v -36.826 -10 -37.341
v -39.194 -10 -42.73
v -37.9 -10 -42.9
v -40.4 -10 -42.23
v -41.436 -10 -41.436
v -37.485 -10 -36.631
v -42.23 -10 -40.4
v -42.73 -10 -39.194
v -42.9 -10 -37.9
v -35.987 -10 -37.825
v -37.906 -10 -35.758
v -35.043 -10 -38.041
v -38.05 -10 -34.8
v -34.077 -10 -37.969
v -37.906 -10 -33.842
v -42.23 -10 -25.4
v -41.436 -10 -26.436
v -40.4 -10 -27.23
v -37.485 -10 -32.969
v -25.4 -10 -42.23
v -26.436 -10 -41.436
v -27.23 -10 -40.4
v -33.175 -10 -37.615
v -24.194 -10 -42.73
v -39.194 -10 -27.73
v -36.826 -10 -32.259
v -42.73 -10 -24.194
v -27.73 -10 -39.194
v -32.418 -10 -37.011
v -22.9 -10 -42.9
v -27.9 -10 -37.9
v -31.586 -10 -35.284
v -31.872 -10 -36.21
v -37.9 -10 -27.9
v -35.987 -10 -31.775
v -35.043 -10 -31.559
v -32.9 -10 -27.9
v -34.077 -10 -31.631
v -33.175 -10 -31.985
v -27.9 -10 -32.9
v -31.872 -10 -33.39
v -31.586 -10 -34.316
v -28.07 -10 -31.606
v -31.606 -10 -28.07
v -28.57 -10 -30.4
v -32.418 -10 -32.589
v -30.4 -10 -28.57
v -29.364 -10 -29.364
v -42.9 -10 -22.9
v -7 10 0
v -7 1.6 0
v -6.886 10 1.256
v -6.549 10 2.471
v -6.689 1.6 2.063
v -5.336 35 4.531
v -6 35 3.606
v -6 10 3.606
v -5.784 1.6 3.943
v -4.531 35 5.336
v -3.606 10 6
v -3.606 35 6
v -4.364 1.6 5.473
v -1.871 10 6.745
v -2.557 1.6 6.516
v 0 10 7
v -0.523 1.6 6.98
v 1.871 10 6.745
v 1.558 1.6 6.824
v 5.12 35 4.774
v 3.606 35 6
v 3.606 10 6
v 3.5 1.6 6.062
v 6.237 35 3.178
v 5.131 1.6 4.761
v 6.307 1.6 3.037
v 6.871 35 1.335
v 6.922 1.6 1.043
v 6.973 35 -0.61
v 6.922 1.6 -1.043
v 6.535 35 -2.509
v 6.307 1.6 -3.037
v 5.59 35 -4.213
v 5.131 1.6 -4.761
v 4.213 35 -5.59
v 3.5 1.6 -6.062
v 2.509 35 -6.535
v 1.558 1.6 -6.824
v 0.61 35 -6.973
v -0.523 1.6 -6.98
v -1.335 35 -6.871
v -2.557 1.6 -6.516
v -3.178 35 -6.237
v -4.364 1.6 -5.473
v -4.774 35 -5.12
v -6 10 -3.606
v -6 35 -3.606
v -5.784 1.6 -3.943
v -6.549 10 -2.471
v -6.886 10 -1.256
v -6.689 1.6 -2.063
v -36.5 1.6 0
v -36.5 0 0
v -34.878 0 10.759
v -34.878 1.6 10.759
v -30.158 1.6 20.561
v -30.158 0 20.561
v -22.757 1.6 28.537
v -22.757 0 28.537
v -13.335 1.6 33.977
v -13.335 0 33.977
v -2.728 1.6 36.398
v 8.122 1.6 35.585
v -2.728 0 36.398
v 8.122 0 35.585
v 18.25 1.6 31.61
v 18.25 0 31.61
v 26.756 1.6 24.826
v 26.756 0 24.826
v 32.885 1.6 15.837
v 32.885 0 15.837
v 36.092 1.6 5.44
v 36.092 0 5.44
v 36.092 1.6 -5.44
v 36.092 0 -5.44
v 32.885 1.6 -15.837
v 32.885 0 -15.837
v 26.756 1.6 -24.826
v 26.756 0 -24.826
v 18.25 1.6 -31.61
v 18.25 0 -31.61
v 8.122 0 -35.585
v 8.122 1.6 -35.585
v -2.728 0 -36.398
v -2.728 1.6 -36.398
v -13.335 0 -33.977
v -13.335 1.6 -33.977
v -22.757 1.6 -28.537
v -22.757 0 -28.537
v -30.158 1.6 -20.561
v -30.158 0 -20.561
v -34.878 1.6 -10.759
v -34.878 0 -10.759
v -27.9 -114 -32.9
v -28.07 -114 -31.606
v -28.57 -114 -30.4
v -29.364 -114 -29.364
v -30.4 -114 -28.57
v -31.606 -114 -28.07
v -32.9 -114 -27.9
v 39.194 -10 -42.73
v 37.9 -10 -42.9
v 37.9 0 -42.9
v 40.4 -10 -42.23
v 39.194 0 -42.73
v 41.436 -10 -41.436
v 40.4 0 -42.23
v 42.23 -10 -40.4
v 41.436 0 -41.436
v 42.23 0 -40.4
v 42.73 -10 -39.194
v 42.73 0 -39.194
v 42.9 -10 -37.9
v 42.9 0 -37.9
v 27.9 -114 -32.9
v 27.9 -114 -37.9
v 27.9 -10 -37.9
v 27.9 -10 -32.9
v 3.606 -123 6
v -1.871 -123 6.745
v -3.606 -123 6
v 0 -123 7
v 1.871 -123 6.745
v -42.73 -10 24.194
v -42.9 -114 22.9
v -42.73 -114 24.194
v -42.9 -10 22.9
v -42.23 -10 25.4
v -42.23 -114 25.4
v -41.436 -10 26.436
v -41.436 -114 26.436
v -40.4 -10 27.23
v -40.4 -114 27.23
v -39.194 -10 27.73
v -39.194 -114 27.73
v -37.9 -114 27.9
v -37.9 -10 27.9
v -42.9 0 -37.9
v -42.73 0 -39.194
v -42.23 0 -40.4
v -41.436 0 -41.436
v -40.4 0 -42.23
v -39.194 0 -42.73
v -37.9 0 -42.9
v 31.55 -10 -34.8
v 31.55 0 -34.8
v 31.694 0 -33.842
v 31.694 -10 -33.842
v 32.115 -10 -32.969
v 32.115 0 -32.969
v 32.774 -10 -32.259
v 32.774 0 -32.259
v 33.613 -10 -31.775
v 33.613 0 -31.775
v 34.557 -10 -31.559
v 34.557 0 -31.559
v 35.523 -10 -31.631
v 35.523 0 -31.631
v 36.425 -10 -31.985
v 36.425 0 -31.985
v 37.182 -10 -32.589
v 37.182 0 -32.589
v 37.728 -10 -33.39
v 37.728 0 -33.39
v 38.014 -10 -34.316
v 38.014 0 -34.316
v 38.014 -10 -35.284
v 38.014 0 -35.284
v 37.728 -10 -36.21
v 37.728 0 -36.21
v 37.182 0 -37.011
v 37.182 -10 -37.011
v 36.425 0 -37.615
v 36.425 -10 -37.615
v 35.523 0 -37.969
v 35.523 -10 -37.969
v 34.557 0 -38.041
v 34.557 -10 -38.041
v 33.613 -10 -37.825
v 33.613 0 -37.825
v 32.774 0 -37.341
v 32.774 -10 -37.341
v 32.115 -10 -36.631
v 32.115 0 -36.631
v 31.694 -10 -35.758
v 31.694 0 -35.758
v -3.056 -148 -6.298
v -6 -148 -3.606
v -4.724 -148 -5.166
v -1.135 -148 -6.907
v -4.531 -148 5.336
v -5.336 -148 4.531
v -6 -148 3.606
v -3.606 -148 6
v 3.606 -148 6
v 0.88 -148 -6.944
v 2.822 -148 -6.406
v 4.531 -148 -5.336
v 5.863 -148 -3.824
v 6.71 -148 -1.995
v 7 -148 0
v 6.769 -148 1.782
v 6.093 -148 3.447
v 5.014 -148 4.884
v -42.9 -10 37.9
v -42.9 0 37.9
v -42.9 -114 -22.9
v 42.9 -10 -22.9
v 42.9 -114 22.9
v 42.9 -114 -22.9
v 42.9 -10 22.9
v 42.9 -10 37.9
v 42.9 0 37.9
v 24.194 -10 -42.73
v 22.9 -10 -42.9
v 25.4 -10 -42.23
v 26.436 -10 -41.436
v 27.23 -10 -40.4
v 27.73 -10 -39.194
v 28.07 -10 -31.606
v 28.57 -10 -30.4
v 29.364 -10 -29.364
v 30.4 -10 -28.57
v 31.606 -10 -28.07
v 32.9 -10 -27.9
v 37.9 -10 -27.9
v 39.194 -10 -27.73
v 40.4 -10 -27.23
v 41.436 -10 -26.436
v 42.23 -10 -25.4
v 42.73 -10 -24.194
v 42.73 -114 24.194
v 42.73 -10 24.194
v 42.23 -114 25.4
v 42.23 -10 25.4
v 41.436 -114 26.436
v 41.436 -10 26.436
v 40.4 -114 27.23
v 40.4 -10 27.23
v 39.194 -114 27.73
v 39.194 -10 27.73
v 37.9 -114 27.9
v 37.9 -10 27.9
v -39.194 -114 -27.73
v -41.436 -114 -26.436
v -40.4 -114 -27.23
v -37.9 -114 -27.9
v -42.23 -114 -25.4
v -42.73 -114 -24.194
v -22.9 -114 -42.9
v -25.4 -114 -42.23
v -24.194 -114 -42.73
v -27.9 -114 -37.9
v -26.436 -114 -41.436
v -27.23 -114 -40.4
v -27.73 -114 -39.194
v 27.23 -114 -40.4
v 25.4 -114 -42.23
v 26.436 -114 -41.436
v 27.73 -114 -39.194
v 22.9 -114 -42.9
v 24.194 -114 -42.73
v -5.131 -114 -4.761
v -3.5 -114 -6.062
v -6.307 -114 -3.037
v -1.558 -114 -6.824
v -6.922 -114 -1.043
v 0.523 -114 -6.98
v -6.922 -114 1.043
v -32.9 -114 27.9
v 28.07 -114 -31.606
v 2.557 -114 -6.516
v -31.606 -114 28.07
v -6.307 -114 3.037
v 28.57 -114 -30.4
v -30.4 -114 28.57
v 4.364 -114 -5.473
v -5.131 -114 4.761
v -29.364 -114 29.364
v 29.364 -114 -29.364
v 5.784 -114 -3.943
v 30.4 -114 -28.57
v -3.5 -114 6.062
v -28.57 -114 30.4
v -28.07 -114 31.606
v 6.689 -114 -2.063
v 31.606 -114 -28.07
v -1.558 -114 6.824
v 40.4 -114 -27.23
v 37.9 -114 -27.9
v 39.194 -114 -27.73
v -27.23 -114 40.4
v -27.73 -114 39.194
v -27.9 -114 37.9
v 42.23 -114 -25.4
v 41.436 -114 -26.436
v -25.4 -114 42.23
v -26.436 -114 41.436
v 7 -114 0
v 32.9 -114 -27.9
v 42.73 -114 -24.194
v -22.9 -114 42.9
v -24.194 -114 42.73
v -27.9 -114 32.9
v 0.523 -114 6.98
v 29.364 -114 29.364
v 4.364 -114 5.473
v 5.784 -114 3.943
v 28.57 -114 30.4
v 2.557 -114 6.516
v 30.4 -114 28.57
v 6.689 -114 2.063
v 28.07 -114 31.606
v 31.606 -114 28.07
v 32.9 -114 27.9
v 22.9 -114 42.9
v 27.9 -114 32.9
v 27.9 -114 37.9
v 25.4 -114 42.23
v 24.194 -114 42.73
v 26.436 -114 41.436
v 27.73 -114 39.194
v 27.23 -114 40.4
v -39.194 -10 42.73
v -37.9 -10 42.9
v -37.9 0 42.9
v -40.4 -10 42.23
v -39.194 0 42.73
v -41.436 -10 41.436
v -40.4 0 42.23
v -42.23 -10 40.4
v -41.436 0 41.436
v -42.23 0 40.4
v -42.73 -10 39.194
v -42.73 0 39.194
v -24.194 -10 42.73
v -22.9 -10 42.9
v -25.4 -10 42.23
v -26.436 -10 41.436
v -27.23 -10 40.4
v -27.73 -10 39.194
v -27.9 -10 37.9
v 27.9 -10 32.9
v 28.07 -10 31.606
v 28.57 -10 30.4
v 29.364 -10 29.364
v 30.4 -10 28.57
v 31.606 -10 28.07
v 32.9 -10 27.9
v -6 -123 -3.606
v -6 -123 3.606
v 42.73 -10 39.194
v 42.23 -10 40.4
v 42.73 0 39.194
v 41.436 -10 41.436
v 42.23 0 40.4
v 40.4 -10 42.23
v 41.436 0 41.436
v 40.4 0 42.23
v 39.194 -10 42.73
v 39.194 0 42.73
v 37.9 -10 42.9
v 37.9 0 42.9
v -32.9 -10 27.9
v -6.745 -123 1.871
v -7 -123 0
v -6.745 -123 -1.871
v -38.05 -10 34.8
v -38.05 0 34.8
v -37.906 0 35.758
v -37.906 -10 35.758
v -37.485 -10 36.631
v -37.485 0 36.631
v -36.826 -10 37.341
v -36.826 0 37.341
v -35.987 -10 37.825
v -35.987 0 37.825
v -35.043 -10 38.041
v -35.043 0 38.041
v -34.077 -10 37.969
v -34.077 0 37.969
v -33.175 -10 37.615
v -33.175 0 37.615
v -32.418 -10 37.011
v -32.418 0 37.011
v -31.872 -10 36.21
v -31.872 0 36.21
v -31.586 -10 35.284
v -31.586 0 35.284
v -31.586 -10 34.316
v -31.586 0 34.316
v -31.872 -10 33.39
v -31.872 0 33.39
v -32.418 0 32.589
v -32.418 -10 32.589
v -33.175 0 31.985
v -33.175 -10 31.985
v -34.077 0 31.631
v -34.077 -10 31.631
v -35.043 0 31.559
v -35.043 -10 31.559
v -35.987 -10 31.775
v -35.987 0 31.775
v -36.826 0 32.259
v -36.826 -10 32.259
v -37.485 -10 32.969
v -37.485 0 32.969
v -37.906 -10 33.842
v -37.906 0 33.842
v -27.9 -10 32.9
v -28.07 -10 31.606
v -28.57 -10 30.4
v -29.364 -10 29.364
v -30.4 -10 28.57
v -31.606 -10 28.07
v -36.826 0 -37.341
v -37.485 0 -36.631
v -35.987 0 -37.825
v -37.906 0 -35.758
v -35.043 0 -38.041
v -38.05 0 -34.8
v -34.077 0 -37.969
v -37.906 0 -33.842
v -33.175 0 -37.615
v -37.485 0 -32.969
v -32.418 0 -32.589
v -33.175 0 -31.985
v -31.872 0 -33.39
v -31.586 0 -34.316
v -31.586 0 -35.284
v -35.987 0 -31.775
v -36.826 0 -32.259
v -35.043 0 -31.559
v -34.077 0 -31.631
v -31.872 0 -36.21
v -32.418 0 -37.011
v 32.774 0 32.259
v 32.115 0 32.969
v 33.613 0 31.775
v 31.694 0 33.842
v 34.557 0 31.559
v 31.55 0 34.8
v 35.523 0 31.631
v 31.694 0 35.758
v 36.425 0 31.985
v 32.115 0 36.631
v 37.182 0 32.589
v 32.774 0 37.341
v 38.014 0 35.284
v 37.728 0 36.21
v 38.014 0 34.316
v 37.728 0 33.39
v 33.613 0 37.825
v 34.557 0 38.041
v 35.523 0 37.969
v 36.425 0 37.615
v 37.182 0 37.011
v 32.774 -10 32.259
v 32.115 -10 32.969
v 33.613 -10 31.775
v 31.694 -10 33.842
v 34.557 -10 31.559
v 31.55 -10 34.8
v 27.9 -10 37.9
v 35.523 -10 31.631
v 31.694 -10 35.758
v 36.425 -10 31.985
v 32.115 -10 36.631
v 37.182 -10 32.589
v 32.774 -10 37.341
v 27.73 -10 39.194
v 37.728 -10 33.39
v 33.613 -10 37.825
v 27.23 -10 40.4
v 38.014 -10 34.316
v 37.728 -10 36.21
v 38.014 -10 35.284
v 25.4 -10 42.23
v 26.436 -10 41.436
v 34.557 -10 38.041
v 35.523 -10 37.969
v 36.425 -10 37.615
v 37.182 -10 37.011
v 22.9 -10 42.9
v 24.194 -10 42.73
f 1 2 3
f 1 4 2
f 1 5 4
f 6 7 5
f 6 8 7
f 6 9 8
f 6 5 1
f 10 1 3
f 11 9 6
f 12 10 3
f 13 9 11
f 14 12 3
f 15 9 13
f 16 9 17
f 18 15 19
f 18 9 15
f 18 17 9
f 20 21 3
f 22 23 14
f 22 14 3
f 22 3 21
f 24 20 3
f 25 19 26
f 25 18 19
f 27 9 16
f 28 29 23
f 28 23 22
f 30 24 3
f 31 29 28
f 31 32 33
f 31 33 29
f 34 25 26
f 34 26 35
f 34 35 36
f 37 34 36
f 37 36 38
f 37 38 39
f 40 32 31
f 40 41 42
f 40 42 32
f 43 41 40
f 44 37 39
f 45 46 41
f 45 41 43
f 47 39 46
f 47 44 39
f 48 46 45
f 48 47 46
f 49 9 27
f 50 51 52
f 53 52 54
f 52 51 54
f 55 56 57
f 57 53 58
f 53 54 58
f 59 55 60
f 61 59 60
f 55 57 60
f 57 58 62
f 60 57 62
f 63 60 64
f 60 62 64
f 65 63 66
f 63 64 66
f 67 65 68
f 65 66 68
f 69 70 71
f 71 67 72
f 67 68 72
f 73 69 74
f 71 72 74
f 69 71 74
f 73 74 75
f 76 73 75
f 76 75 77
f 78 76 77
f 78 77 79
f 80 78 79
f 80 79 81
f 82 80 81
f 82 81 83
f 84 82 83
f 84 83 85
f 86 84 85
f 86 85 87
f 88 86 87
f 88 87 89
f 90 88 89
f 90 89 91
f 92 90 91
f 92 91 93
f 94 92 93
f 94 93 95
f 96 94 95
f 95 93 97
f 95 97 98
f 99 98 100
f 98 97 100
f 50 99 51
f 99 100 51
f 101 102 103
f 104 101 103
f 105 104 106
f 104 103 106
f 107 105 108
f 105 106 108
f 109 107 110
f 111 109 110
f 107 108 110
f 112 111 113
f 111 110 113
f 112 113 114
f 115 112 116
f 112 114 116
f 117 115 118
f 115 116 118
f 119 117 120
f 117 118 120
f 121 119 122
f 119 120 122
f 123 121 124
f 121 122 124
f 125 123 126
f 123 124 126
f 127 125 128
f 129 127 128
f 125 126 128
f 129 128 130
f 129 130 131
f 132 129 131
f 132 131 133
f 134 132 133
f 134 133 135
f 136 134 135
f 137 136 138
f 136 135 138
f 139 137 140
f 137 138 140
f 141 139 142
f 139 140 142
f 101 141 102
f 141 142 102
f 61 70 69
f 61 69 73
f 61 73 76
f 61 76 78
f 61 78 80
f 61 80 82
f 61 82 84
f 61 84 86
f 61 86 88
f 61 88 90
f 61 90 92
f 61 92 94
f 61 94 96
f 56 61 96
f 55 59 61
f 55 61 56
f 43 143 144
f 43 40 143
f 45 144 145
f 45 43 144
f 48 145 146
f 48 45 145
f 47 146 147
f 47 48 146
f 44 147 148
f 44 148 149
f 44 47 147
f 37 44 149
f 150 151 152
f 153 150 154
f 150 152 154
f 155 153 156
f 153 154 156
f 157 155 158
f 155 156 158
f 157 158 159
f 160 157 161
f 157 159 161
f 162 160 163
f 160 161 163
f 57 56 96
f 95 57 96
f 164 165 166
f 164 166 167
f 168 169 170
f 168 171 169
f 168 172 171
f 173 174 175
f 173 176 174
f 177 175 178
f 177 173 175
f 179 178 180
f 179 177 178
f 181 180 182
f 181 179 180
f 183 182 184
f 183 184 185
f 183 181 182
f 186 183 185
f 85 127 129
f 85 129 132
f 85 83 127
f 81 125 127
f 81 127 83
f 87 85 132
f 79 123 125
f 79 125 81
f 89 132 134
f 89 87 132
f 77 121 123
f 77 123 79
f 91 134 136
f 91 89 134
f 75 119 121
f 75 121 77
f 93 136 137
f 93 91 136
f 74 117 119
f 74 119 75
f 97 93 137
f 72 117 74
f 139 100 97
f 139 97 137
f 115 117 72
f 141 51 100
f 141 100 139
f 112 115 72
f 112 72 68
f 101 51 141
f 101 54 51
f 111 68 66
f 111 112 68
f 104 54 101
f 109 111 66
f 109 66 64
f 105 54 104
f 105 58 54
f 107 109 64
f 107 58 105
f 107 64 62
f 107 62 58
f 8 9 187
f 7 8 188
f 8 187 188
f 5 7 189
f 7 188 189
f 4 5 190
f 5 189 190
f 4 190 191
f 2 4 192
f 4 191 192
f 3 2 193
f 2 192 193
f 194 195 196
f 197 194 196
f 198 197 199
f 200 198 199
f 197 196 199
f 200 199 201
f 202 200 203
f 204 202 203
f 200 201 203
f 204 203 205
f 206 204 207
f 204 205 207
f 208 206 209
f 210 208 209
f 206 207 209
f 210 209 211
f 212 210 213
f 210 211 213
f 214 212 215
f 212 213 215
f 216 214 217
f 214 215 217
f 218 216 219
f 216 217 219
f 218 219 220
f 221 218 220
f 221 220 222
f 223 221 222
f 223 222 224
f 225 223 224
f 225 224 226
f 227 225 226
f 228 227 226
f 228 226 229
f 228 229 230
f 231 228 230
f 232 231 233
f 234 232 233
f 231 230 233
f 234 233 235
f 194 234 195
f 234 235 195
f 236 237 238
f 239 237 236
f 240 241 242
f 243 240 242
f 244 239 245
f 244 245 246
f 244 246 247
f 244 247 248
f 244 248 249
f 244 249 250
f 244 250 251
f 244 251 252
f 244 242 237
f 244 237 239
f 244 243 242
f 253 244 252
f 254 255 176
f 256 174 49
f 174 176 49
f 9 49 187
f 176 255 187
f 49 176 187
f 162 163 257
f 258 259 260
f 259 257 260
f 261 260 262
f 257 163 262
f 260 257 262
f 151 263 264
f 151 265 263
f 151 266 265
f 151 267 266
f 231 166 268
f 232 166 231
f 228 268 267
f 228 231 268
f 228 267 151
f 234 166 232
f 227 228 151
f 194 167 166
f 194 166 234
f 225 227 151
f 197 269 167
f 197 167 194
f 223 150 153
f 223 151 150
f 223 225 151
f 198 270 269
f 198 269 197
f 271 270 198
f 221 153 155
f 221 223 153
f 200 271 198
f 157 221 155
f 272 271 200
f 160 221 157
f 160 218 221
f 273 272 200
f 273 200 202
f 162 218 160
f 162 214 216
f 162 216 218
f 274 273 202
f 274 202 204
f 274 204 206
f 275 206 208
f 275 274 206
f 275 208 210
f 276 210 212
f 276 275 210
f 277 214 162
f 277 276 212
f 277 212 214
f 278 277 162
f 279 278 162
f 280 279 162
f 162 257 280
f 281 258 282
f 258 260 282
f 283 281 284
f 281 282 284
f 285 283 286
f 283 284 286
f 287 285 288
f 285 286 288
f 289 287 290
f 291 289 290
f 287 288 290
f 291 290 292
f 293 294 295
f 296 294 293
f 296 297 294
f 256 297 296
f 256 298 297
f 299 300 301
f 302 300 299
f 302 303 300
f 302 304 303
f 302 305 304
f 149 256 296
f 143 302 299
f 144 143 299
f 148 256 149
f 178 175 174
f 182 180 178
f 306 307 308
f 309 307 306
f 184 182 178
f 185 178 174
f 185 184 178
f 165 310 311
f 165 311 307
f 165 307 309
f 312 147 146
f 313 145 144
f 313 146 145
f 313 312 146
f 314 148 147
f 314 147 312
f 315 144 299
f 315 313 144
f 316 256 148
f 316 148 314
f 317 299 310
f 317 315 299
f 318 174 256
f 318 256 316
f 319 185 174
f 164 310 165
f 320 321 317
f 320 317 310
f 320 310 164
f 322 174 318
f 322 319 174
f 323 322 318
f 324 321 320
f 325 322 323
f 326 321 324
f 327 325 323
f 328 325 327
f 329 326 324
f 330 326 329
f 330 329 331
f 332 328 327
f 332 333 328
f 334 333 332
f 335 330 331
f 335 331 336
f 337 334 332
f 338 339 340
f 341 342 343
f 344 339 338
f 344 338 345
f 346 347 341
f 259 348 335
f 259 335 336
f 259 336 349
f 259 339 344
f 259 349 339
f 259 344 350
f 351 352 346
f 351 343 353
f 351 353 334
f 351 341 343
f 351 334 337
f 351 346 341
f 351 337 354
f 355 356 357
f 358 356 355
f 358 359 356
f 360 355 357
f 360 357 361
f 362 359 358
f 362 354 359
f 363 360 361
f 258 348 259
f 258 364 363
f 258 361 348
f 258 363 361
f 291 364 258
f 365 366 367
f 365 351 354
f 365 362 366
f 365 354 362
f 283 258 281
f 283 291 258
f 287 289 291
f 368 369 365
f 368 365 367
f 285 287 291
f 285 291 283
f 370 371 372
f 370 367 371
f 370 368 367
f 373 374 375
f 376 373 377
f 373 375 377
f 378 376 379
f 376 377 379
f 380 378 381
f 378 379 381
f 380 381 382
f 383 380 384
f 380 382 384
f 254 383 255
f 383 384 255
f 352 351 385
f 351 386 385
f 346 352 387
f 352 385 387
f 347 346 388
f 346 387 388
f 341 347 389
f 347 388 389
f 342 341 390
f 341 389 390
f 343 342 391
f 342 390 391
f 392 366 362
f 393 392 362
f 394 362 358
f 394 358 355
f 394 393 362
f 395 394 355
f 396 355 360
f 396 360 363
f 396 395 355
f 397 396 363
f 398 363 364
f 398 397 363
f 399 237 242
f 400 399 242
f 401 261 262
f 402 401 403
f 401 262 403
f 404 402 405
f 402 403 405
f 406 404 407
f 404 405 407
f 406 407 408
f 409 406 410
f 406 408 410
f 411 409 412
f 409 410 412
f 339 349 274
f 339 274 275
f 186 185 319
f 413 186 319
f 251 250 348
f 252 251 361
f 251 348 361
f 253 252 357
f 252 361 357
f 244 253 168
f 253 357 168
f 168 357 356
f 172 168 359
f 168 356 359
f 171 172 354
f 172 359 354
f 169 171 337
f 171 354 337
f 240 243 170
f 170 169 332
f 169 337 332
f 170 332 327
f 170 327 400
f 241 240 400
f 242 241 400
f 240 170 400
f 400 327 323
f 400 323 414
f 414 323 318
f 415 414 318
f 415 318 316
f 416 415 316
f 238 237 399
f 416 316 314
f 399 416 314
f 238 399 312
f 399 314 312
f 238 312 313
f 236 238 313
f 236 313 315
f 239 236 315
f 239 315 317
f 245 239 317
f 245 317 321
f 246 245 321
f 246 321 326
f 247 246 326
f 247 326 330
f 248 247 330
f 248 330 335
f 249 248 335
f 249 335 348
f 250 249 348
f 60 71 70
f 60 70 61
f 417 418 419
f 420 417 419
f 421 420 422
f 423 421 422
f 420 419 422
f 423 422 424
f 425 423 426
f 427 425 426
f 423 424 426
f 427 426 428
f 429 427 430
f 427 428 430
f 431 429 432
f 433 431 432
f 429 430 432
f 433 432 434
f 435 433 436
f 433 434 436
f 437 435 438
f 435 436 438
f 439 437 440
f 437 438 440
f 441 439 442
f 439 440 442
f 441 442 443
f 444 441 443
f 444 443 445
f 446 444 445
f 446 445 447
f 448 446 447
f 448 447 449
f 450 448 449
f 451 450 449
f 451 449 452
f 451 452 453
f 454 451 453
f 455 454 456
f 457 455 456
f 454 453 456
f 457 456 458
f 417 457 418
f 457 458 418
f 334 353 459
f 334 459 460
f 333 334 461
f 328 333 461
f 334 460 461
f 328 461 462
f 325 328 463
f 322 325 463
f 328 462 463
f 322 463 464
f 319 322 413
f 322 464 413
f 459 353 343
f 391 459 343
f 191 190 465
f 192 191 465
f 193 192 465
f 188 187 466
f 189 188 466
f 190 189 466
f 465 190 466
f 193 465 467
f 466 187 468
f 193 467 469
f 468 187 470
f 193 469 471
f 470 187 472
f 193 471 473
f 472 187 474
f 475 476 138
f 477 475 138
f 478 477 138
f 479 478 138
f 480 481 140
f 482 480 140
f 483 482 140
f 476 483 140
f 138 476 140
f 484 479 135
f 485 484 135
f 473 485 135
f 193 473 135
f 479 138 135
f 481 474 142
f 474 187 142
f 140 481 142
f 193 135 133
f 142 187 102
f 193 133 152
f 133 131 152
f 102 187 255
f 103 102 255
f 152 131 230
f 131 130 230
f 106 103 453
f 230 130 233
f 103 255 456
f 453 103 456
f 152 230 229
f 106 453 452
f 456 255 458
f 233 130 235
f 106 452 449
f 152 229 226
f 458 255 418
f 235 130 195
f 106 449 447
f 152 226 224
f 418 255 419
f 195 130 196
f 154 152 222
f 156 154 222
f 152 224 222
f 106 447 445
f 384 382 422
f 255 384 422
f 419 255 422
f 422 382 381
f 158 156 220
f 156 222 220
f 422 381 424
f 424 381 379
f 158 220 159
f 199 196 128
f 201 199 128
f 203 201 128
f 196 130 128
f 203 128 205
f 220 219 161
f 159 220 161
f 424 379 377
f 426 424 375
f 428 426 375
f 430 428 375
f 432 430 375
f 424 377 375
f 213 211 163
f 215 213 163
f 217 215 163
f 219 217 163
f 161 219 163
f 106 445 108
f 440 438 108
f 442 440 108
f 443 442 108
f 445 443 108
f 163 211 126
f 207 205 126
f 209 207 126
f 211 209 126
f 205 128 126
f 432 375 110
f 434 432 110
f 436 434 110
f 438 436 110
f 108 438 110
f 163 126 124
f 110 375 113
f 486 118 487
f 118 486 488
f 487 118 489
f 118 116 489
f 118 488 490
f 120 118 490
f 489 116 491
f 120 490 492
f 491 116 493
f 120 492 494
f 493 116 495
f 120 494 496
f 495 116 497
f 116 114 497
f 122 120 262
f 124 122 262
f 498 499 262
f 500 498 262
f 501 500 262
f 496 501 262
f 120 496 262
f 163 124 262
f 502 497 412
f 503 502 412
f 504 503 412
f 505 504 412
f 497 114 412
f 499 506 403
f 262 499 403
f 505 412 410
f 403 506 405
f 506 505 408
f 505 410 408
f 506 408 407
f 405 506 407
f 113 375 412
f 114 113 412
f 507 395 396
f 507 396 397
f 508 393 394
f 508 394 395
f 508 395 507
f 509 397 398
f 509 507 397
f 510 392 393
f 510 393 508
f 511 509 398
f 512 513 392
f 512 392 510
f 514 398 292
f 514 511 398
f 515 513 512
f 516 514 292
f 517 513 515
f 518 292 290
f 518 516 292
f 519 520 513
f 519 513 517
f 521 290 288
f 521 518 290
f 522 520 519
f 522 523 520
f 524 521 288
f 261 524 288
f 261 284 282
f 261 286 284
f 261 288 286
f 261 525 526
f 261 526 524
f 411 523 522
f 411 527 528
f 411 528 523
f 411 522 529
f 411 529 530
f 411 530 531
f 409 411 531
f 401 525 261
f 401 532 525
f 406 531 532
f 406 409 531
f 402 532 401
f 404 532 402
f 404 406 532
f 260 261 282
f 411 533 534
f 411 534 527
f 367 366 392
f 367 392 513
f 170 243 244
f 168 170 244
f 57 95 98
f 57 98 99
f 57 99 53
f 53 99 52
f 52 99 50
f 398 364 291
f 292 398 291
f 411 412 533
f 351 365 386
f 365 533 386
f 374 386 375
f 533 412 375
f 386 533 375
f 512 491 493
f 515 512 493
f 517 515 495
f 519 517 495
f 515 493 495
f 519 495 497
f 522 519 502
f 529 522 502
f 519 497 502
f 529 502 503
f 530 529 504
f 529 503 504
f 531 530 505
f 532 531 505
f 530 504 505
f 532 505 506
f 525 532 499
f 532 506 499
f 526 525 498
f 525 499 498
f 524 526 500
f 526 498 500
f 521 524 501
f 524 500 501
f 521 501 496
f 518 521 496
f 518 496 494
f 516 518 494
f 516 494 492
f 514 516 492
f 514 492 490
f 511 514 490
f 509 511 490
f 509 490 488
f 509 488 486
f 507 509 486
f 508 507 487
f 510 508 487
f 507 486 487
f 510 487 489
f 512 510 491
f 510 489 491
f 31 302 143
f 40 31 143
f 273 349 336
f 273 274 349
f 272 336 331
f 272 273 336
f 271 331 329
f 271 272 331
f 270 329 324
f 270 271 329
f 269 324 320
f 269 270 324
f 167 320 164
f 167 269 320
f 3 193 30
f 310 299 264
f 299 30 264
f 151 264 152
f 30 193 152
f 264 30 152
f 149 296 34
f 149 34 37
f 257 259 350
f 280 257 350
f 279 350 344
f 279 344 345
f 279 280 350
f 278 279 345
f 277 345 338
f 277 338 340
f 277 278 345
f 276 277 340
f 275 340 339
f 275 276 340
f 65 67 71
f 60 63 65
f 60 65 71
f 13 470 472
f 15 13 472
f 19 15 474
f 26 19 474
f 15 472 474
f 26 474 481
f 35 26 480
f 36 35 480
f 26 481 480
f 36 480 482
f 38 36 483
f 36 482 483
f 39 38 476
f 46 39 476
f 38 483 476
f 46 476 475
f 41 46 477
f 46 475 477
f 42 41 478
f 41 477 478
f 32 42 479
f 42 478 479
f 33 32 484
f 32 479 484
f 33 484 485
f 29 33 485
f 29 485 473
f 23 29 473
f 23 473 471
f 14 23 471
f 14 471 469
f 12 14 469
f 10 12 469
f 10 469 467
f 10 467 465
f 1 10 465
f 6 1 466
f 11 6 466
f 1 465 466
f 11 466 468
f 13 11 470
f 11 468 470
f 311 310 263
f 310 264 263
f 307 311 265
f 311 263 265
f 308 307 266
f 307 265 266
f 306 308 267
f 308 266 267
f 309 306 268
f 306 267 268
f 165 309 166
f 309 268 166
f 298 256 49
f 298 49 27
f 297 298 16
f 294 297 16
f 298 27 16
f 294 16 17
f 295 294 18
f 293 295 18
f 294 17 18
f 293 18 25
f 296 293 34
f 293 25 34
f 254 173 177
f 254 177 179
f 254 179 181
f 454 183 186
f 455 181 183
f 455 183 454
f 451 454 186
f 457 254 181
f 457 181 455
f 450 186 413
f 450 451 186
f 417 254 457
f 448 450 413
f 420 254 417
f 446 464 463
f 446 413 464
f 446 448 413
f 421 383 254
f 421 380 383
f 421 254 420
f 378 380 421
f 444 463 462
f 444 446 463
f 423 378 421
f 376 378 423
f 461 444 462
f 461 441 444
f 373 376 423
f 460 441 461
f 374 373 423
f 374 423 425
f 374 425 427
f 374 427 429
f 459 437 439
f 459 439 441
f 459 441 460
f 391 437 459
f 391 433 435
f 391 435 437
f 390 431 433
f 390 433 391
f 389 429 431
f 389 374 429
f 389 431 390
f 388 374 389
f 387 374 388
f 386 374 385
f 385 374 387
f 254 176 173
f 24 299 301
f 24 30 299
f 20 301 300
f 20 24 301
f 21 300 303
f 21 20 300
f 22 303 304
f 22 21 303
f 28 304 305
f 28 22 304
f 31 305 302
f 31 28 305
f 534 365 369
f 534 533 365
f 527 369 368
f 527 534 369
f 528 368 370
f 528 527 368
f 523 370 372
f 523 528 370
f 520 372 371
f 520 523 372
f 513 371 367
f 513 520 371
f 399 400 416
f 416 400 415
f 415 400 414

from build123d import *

# Parameters (mm, degrees)
F1_DEPTH  = 114
F2_W      = 15
F2_H      = 15
F3_DEPTH  = 104
F4_R      = 3.25
F5_DEPTH  = 10
F6_R      = 5
F7_R      = 36.5
F8_DEPTH  = 1.6
F9_R      = 7
F10_DEPTH = 35
F12_DEPTH = 25
F13_R     = 7
F14_DEPTH = 34
F16_DEPTH = 25


with BuildPart() as f1:
    # F0 (on Front) → F1 (new body)
    with BuildSketch(Plane.XZ):
        with BuildLine():
            Line((37.9, 42.9), (-37.9, 42.9))
            ThreePointArc((-37.9, 42.9), (-41.4355339059, 41.4355339059), (-42.9, 37.9))
            Line((-42.9, 37.9), (-42.9, -37.9))
            ThreePointArc((-42.9, -37.9), (-41.4355339059, -41.4355339059), (-37.9, -42.9))
            Line((-37.9, -42.9), (37.9, -42.9))
            ThreePointArc((37.9, -42.9), (41.4355339059, -41.4355339059), (42.9, -37.9))
            Line((42.9, -37.9), (42.9, 37.9))
            ThreePointArc((42.9, 37.9), (41.4355339059, 41.4355339059), (37.9, 42.9))
        make_face()
    extrude(amount=F1_DEPTH)

    # F2 (on face) → F3 (cut)
    with BuildSketch(Plane.XZ.offset(114)):
        with Locations((35.4, 35.4)):
            Rectangle(F2_W, F2_H)
        with Locations((-35.4, 35.4)):
            Rectangle(F2_W, F2_H)
        with Locations((-35.4, -35.4)):
            Rectangle(F2_W, F2_H)
        with Locations((35.4, -35.4)):
            Rectangle(F2_W, F2_H)
    extrude(amount=-F3_DEPTH, mode=Mode.SUBTRACT)

    # F4 (on face) → F5 (cut, through all)
    with BuildSketch(Plane(origin=(0, 0, 0), x_dir=(-1, 0, 0), z_dir=(0, 1, 0))):
        with Locations((34.8, 34.8)):
            Circle(F4_R)
        with Locations((-34.8, 34.8)):
            Circle(F4_R)
        with Locations((34.8, -34.8)):
            Circle(F4_R)
        with Locations((-34.8, -34.8)):
            Circle(F4_R)
    extrude(amount=-F5_DEPTH, mode=Mode.SUBTRACT)

    # F6
    f6_edges = [f1.edges().sort_by_distance(p)[0] for p in [
        (-42.9, -62, 27.9),
        (-42.9, -62, -27.9),
        (-27.9, -62, -27.9),
        (-27.9, -62, -42.9),
        (27.9, -62, -42.9),
        (-27.9, -62, 42.9),
        (27.9, -62, -27.9),
        (42.9, -62, -27.9),
        (42.9, -62, 27.9),
        (27.9, -62, 42.9),
        (27.9, -62, 27.9),
        (-27.9, -62, 27.9),
    ]]
    fillet(f6_edges, radius=F6_R)

    # F7 (on face) → F8 (join)
    with BuildSketch(Plane(origin=(0, 0, 0), x_dir=(-1, 0, 0), z_dir=(0, 1, 0))):
        Circle(F7_R)
    extrude(amount=F8_DEPTH)

    # F9 (on face) → F10 (join)
    with BuildSketch(Plane(origin=(0, 0, 0), x_dir=(-1, 0, 0), z_dir=(0, 1, 0))):
        Circle(F9_R)
    extrude(amount=F10_DEPTH)

    # F11 (on face) → F12 (cut)
    with BuildSketch(Plane(origin=(0, 35, 0), x_dir=(-1, 0, 0), z_dir=(0, 1, 0))):
        Polygon((-14.5420123405, 12.7583807334), (-14.5420123405, 6), (6, 6), (6, -12.0489969126), (13.1983235478, -12.4650839716), (13.1983235478, 12.7583807334), align=None)
    extrude(amount=-F12_DEPTH, mode=Mode.SUBTRACT)

    # F13 (on face) → F14 (join)
    with BuildSketch(Plane.XZ.offset(114)):
        Circle(F13_R)
    extrude(amount=F14_DEPTH)

    # F15 (on face) → F16 (cut)
    with BuildSketch(Plane.XZ.offset(148)):
        Polygon((-6, -11.1548621207), (-6, 6), (6, 6), (-11.2425461411, 11.0141066834), align=None)
    extrude(amount=-F16_DEPTH, mode=Mode.SUBTRACT)


solid = f1.part
